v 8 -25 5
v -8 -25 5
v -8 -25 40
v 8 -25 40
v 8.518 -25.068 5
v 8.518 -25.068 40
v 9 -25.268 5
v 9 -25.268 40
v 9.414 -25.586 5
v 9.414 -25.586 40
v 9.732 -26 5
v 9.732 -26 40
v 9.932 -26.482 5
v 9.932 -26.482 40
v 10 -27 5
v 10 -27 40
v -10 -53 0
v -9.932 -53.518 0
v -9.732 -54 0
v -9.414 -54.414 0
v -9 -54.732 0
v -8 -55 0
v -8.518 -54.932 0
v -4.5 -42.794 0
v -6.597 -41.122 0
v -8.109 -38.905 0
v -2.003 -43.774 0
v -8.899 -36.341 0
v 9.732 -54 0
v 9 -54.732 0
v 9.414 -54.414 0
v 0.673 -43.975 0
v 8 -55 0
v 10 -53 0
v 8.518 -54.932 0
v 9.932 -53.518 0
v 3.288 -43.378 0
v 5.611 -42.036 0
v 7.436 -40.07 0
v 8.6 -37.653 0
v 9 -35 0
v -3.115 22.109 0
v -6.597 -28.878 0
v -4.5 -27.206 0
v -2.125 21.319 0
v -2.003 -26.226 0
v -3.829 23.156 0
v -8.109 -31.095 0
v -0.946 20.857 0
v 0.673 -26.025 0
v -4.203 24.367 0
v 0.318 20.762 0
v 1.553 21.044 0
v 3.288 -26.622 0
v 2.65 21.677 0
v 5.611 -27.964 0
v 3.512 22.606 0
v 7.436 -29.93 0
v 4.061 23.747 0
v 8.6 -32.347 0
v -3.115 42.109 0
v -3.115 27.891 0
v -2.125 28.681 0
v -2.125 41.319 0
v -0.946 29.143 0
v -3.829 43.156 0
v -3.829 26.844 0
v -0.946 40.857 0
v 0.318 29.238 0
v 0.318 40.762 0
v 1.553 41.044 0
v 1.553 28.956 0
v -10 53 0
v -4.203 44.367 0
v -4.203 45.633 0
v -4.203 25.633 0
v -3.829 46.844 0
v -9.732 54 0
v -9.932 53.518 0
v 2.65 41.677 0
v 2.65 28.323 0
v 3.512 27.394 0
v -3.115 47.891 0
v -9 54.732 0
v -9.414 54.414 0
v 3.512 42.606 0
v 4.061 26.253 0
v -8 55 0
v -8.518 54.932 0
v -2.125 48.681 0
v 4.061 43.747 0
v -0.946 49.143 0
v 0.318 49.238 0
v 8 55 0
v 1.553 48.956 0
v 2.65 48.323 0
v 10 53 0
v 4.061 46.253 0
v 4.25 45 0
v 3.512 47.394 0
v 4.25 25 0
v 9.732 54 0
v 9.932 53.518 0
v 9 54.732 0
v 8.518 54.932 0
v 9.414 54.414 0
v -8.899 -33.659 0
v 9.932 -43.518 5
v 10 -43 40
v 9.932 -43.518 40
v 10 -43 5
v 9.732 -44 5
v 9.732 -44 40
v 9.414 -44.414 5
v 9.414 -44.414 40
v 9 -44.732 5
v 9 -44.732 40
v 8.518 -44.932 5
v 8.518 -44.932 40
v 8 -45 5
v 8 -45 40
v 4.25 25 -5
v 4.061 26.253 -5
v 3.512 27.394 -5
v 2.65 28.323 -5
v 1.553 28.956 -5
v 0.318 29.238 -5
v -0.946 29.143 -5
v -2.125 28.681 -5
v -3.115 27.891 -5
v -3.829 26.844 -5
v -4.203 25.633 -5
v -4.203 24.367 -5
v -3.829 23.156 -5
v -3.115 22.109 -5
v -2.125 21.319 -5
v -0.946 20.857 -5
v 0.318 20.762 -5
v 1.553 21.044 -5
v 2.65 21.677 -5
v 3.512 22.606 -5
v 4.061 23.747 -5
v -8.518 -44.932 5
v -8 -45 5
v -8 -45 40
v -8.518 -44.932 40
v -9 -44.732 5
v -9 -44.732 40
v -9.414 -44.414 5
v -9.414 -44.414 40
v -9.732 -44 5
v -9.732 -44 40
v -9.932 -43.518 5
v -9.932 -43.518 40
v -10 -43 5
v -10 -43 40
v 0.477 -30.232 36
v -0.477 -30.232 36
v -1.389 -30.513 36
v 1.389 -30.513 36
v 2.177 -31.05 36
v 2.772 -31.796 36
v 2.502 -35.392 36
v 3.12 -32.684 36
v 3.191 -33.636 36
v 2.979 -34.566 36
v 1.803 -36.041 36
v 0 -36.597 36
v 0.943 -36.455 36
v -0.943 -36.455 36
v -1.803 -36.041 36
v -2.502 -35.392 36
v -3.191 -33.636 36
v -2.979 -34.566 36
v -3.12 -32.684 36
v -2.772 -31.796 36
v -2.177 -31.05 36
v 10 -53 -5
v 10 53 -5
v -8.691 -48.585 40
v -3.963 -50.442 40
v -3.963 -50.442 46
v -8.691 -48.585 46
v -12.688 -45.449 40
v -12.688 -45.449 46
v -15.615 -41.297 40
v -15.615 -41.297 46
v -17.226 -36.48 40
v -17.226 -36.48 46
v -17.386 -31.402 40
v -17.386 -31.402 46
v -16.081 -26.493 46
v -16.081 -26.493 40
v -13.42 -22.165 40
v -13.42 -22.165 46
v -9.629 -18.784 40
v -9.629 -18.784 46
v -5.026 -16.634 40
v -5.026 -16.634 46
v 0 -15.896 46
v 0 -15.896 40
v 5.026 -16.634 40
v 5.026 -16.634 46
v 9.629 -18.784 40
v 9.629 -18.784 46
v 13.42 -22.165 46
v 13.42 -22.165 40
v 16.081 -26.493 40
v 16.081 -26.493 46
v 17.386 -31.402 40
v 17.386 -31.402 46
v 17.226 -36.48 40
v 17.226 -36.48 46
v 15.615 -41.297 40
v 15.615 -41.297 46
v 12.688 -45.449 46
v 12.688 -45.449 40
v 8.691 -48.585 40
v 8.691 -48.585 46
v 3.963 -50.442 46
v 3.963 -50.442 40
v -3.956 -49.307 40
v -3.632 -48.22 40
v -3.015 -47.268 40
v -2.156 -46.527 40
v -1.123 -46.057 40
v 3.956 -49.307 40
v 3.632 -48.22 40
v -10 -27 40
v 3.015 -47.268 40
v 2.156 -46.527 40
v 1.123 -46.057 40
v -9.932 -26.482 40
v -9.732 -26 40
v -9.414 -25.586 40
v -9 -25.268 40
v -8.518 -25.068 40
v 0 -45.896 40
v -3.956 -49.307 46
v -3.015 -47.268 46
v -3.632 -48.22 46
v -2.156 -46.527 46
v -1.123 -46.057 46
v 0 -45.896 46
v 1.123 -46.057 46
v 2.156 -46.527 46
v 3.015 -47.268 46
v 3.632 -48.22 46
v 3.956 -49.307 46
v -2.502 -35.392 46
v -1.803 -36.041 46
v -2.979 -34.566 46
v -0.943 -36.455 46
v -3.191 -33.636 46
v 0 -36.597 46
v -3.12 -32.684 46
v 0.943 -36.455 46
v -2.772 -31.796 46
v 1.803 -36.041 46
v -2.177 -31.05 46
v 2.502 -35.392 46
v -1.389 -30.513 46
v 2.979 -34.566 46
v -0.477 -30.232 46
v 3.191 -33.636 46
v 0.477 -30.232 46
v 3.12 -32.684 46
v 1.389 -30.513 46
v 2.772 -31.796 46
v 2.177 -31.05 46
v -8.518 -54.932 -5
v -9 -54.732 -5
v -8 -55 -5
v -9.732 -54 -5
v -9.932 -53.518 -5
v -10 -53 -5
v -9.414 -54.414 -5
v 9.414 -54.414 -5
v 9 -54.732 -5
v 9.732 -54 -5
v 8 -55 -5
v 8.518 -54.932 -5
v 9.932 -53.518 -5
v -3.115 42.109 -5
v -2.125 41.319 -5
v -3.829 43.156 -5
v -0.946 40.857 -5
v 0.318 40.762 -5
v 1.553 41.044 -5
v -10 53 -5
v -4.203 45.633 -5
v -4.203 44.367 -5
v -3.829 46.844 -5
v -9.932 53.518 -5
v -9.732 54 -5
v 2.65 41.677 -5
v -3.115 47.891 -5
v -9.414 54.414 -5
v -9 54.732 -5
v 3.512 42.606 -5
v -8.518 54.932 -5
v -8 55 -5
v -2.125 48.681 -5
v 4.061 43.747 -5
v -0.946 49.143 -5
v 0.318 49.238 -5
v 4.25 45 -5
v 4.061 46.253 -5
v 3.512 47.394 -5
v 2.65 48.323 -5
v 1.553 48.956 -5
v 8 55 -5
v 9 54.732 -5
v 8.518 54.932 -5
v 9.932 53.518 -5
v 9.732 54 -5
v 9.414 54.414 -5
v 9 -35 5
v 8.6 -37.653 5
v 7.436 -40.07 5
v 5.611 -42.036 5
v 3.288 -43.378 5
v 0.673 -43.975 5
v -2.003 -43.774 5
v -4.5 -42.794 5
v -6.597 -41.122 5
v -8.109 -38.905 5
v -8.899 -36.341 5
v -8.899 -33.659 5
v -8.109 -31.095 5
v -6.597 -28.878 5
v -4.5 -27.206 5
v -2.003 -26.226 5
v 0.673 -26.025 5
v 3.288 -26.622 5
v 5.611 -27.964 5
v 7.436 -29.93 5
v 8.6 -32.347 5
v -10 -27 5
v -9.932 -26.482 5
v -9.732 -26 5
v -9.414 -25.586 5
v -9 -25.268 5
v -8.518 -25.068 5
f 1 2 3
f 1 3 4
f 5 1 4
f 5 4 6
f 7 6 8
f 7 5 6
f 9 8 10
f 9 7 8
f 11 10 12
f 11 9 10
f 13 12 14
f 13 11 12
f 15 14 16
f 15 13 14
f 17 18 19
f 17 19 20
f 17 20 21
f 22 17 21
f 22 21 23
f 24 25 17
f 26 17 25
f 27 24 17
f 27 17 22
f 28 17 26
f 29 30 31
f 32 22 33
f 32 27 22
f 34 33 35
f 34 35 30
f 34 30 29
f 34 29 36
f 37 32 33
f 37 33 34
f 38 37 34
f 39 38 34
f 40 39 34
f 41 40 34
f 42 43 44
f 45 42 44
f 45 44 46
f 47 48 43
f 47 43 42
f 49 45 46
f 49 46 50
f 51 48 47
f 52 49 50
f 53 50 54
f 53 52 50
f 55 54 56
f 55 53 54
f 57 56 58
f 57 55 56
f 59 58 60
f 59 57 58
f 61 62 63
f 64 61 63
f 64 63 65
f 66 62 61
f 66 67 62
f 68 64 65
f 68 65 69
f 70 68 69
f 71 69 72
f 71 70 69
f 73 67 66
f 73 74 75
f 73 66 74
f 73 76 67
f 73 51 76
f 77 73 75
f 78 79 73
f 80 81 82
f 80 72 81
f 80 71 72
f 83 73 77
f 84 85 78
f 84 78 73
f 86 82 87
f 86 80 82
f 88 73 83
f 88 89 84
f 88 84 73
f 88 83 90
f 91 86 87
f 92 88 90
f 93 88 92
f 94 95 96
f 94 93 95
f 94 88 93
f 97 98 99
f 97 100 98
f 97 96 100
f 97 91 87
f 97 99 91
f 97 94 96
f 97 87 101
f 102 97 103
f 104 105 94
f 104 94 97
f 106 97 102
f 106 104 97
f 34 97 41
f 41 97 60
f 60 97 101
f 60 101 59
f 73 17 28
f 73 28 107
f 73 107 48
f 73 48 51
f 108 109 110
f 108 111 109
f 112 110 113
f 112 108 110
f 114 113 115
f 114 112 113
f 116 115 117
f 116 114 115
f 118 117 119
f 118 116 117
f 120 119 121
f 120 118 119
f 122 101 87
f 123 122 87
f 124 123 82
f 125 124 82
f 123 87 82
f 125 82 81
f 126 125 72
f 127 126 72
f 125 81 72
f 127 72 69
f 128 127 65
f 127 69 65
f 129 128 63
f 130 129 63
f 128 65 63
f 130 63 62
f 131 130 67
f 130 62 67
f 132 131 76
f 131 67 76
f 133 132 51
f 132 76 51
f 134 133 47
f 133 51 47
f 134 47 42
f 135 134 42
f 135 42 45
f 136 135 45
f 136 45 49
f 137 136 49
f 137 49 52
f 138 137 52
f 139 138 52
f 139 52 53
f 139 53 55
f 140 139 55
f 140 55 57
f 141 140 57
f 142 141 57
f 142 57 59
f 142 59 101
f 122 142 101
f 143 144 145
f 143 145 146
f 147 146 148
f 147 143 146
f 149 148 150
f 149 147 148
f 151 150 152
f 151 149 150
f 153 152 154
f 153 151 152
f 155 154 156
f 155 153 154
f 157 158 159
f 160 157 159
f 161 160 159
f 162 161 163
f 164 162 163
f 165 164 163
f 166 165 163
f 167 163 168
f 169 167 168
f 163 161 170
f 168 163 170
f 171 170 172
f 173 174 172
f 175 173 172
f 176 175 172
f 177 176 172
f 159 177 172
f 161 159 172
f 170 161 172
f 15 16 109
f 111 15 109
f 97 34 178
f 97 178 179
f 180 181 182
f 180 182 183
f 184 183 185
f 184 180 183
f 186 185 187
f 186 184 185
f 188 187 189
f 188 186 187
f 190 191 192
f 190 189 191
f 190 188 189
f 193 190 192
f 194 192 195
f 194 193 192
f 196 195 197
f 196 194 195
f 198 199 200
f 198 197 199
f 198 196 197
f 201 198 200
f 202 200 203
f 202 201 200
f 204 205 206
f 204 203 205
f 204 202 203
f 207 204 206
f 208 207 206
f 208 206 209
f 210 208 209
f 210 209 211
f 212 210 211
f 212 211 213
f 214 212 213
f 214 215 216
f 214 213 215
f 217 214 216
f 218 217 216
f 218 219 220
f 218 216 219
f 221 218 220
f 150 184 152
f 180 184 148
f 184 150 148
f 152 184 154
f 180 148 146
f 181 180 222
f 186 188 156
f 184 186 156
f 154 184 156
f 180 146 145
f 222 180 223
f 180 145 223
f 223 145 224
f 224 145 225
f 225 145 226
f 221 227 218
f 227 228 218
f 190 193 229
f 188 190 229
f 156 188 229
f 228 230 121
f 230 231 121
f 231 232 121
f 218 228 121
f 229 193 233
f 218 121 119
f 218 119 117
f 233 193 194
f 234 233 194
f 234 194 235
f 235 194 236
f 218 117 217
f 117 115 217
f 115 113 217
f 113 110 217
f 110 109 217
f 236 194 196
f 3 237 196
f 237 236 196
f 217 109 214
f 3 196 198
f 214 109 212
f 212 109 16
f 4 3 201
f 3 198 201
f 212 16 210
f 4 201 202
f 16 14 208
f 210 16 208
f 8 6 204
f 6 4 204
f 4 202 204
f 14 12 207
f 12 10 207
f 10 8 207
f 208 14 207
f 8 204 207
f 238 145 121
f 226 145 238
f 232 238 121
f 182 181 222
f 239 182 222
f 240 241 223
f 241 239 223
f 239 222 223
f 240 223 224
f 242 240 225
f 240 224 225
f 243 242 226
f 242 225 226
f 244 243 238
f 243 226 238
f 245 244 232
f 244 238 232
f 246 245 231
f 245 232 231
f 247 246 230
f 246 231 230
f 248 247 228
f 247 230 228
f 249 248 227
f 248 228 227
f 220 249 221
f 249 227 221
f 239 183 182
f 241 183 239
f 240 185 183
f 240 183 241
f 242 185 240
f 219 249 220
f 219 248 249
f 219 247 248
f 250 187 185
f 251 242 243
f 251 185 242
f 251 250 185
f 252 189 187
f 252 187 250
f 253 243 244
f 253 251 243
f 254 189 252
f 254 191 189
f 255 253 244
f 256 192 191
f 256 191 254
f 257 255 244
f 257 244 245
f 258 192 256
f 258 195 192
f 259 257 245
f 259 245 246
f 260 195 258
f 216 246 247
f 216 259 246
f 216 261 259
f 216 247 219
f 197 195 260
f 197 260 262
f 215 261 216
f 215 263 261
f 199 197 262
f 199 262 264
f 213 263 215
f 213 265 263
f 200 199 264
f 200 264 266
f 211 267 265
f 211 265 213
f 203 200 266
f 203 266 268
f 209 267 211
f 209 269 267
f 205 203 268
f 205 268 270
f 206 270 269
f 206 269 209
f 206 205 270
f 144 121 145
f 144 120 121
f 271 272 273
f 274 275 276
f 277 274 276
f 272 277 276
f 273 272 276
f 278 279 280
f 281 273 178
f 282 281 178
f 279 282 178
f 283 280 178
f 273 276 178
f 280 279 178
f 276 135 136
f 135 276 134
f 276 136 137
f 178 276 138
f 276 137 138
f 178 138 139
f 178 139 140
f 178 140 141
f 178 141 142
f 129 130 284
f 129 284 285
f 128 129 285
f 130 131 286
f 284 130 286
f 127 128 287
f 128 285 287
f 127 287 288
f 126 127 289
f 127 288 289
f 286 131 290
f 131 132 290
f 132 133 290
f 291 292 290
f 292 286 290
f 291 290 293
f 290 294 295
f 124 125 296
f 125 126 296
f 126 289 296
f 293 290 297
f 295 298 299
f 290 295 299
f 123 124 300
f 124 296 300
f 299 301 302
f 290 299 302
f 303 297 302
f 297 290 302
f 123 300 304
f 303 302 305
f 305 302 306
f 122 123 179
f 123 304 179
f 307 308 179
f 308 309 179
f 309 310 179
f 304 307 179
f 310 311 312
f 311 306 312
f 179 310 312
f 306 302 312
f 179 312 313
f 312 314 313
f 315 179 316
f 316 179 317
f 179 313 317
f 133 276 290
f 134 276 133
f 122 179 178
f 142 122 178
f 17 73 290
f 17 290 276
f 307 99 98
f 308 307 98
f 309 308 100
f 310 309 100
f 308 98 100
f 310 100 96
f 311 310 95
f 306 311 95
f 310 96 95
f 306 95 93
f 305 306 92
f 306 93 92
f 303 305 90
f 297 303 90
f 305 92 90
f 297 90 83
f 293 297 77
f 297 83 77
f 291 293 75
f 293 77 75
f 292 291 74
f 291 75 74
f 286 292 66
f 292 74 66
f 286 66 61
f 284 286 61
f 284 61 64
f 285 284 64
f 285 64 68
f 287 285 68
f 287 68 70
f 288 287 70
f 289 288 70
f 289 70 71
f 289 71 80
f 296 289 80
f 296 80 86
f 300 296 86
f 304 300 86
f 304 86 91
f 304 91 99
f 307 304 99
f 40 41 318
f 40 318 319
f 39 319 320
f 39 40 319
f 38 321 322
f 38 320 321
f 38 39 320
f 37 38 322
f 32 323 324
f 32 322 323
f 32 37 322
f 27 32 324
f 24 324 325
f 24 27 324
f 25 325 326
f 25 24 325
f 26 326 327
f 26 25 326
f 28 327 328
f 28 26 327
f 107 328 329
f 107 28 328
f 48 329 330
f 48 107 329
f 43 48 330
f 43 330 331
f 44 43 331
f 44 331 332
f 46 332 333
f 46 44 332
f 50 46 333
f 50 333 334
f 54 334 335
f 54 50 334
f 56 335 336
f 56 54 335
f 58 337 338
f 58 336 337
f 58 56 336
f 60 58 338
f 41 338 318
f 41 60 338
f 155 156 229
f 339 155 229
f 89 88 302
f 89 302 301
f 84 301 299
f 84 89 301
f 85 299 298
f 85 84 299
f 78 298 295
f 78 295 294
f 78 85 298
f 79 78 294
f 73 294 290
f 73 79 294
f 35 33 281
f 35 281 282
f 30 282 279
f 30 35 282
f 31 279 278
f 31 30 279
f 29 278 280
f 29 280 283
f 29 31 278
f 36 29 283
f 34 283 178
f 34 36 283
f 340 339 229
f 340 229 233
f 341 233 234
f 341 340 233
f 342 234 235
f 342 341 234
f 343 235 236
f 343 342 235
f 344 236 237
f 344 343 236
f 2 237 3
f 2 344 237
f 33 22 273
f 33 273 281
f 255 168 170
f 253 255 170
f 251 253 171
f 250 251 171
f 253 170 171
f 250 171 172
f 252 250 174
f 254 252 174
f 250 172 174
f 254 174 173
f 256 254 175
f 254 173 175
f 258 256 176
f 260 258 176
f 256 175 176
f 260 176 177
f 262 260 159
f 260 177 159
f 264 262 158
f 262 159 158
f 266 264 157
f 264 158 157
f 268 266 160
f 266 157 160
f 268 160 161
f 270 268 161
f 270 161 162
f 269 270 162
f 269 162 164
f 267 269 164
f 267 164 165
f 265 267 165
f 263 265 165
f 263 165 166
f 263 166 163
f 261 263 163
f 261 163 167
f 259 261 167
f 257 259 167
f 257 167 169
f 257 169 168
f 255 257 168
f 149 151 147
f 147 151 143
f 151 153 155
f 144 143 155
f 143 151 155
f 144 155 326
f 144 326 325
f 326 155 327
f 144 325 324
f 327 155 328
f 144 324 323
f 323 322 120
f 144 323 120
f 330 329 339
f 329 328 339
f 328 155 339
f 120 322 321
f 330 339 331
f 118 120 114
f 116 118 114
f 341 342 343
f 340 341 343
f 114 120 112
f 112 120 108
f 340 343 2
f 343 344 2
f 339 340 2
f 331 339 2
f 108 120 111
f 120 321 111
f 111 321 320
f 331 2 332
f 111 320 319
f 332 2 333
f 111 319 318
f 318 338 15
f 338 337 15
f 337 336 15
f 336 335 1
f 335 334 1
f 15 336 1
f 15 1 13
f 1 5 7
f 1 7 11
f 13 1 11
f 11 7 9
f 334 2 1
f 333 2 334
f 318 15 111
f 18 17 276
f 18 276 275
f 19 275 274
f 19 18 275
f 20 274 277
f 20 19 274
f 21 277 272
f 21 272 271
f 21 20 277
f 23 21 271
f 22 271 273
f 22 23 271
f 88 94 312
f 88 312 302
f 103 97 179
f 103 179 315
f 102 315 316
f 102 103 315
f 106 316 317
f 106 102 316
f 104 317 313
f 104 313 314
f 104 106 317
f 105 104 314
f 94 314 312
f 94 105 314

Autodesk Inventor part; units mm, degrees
ref_plane "YZ Plane" through (0, 0, 0) normal (1, 0, 0) x (0, 1, 0)
ref_plane "XZ Plane" through (0, 0, 0) normal (0, 1, 0) x (-1, 0, 0)
ref_plane "XY Plane" through (0, 0, 0) normal (0, 0, 1) x (1, 0, 0)
sketch "Esquisse1" plane through (0, 0, 0) normal (0, 0, 1) x (1, 0, 0)
  line L0 (-8, -55) -> (8, -55)
  line L1 (10, -53) -> (10, 53)
  line L2 (8, 55) -> (-8, 55)
  line L3 (-10, 53) -> (-10, -53)
  line L4 (-10, -55) -> (10, 55) construction
  line L5 (10, -55) -> (-10, 55) construction
  arc A0 (-8, 55) -> (-10, 53) centre (-8, 53) ccw
  arc A1 (-10, -53) -> (-8, -55) centre (-8, -53) ccw
  arc A2 (8, -55) -> (10, -53) centre (8, -53) ccw
  arc A3 (10, 53) -> (8, 55) centre (8, 53) ccw
  circle A4 centre (0, 45) radius 4.25
  circle A5 centre (0, 25) radius 4.25
  point P0 (0, 0)
  dimension "d0" = 20
  dimension "d1" = 110
  dimension "d2" = 2
  dimension "d3" = 8.5
  dimension "d4" = 8.5
  dimension "d5" = 80
  dimension "d6" = 20
extrude "Extrusion1" add sketch "Esquisse1" against normal blind 5
sketch "Esquisse2" plane through (0, 0, 0) normal (0, 0, 1) x (1, 0, 0)
  circle A0 centre (0, -35) radius 9
  line L0 (-8, -55) -> (8, -55) projected
  point P0 (0, 0)
  dimension "d9" = 18
  dimension "d10" = 20
extrude "Extrusion2" add sketch "Esquisse2" along normal blind 5
sketch "Esquisse3" plane through (0, -35, 5) normal (0, 0, 1) x (1, 0, 0)
  line L0 (-8, 10) -> (8, 10)
  line L1 (10, 8) -> (10, -8)
  line L2 (8, -10) -> (-8, -10)
  line L3 (-10, -8) -> (-10, 8)
  line L4 (-10, 10) -> (10, -10) construction
  line L5 (10, 10) -> (-10, -10) construction
  arc A0 (-8, 10) -> (-10, 8) centre (-8, 8) ccw
  arc A1 (-10, -8) -> (-8, -10) centre (-8, -8) ccw
  arc A2 (8, -10) -> (10, -8) centre (8, -8) ccw
  arc A3 (10, 8) -> (8, 10) centre (8, 8) ccw
  point P0 (0, 35)
  point P1 (0, 0)
  dimension "d13" = 20
  dimension "d14" = 20
  dimension "d17" = 2
extrude "Extrusion3" add sketch "Esquisse3" along normal blind 35
sketch "Esquisse4" plane through (0, -35, 40) normal (0, 0, 1) x (1, 0, 0)
  arc A0 (3.9626, -15.4418) -> (-3.9626, -15.4418) centre (0, 1.6036) ccw
  arc A1 (3.9626, -15.4418) -> (-3.9626, -15.4418) centre (0, -14.8964) ccw
  point P0 (0, 35)
  dimension "d18" = 35
  dimension "d19" = 8
  dimension "d20" = 16.5
extrude "Extrusion4" add sketch "Esquisse4" along normal blind 6
sketch "Esquisse5" plane through (0, -35, 46) normal (0, 0, 1) x (1, 0, 0)
  arc A0 (3.9626, -15.4418) -> (-3.9626, -15.4418) centre (0, 1.6036) ccw projected
  point P0 (0, 35)
hole "Perçage1" at (0, -33.3964, 46) direction (0, 0, -1) diameter 6.4008 depth 10 counterbore diameter 12.6 counterbore depth 0 thread size "5/16-18 UNC" class "2B" standard "ANSI Unified Screw Threads"
properties part number "SupportTendeurV2"
